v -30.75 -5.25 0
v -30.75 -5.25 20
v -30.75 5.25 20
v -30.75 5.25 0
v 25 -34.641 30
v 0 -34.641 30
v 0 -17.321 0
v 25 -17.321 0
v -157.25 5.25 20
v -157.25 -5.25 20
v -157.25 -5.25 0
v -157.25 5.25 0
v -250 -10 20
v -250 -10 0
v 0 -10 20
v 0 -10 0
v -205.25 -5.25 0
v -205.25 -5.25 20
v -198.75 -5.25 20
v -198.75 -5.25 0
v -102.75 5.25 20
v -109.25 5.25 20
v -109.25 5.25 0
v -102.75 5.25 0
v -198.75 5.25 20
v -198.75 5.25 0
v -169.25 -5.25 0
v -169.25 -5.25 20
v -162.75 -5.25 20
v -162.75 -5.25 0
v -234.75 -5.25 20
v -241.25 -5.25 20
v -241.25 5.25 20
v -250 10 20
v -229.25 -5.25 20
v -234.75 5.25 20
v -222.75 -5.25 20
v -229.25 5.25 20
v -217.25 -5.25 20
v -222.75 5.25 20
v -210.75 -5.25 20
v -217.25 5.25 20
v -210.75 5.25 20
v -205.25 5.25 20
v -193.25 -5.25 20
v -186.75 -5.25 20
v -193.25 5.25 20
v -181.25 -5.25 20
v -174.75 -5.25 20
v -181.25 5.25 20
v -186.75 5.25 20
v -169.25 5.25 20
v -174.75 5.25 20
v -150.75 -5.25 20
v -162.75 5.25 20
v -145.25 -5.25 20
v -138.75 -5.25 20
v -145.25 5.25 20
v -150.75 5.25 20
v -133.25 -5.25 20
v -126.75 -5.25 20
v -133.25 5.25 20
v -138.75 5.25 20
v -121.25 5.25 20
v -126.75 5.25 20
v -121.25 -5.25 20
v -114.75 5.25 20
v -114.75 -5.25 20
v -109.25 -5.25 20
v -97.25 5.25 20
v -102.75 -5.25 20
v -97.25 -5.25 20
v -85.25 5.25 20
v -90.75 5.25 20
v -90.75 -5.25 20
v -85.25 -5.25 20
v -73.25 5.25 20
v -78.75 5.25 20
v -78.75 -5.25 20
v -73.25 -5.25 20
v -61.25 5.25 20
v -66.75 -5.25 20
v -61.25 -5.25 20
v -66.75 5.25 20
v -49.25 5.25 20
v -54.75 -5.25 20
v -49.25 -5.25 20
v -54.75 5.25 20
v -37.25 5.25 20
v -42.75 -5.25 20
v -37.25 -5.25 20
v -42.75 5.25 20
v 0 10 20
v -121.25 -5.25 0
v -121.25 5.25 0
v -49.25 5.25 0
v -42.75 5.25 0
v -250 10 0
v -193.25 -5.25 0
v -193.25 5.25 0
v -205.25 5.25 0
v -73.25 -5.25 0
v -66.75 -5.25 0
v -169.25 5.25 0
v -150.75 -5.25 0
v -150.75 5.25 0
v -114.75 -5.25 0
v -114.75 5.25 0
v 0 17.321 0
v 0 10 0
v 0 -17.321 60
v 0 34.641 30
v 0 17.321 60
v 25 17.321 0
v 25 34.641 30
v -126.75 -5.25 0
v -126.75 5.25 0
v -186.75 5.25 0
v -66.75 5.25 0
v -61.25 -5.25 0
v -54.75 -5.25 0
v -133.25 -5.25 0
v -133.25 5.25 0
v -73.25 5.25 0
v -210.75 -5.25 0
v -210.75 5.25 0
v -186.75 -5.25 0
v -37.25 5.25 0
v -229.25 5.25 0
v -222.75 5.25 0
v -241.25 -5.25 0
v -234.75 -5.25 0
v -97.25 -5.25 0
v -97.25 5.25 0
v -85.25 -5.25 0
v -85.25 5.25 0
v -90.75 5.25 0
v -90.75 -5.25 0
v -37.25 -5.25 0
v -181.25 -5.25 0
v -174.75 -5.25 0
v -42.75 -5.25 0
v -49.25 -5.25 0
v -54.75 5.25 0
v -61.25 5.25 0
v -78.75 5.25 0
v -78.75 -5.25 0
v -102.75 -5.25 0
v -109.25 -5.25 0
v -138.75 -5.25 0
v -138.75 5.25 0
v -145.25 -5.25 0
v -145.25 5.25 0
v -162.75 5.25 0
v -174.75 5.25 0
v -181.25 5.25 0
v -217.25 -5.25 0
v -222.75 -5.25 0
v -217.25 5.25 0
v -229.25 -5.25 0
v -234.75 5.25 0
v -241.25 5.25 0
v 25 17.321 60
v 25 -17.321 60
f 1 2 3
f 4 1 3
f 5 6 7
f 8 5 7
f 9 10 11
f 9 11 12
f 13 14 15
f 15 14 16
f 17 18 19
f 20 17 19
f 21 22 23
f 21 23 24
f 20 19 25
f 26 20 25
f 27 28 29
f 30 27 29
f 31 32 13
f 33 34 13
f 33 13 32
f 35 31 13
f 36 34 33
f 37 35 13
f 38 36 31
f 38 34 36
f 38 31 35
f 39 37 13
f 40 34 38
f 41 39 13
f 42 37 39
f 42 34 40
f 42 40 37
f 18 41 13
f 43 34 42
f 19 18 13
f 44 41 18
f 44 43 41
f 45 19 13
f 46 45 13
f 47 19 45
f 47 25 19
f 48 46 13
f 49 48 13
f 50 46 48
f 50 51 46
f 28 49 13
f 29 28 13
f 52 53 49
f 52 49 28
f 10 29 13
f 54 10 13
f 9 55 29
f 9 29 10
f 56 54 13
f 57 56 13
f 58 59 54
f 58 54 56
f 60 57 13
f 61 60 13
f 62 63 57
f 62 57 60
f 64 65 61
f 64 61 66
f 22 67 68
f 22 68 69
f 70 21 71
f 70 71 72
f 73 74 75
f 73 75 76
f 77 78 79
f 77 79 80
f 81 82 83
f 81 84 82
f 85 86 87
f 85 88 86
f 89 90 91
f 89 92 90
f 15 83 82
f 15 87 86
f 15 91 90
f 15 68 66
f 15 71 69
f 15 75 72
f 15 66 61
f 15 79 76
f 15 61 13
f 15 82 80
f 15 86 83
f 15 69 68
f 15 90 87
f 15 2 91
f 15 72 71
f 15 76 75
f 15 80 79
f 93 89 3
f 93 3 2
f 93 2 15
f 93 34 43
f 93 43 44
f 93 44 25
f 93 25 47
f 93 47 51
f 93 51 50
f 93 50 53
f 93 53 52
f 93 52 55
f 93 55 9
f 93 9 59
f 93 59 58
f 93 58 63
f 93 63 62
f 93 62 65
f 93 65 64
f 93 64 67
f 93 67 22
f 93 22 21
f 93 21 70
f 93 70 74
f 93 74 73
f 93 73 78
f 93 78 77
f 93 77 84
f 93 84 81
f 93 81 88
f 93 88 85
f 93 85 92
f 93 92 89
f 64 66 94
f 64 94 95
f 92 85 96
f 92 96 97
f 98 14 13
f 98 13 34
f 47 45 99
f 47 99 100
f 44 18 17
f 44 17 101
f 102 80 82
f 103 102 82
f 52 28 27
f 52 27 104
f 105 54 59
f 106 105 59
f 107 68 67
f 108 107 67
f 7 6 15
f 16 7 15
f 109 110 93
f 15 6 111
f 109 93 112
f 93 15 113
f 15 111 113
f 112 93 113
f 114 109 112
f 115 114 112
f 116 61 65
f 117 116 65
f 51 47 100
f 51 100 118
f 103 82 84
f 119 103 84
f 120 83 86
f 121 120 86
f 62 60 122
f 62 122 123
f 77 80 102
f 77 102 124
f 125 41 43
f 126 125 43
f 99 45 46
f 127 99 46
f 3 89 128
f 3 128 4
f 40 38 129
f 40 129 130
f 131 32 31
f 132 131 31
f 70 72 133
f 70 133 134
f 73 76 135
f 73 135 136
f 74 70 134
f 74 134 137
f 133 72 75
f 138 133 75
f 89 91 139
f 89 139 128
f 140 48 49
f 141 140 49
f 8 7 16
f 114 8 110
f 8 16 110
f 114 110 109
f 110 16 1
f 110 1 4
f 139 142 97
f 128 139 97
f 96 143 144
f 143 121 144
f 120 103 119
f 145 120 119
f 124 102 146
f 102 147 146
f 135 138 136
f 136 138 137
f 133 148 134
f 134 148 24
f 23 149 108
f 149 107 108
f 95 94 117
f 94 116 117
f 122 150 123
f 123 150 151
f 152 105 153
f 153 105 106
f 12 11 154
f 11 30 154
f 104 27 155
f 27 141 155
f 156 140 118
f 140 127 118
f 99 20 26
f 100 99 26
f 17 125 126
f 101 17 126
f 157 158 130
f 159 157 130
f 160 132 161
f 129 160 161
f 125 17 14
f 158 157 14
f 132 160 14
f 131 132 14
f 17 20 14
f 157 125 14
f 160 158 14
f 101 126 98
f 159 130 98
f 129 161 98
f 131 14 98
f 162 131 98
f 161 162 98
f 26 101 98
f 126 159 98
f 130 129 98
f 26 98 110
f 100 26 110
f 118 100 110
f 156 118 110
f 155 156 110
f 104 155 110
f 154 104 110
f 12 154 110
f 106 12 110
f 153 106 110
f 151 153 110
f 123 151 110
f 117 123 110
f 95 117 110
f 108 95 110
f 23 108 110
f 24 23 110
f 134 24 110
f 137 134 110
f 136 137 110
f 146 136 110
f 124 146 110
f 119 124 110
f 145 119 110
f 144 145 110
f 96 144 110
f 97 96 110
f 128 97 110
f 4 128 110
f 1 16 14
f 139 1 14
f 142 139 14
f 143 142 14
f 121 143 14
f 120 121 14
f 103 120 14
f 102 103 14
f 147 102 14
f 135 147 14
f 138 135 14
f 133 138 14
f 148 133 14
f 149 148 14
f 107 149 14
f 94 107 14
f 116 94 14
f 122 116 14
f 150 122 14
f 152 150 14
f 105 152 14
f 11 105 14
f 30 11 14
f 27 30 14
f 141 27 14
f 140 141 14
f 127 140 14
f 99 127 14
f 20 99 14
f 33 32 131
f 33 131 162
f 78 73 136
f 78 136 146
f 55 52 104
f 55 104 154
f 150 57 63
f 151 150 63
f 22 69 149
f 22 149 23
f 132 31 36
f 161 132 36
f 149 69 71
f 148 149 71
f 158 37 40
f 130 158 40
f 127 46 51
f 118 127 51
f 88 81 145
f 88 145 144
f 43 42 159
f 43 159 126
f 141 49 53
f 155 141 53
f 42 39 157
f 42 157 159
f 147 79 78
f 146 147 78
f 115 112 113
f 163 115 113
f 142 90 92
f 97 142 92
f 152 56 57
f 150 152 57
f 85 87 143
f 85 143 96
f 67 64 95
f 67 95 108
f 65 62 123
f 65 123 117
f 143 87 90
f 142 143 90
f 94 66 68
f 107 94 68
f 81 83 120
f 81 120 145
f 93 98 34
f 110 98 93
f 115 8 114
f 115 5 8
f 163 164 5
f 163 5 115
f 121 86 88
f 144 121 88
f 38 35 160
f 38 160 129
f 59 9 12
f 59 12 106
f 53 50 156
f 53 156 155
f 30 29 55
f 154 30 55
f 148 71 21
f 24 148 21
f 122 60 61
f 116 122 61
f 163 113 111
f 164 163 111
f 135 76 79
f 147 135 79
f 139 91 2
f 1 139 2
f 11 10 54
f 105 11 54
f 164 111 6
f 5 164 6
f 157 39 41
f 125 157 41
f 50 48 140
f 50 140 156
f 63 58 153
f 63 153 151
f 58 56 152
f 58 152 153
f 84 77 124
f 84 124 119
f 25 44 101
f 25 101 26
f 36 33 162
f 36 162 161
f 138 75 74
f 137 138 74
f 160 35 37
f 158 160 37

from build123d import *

# Parameters (mm, degrees)
F1_DEPTH = 25
F2_W     = 250
F2_H     = 20
F3_DEPTH = 20
F4_W     = 6.5
F4_H     = 10.5
F5_DEPTH = 100
F6_W     = 28.428983
F6_H     = 14.421839
F7_DEPTH = 20


with BuildPart() as f1:
    # F0 (on Right) → F1 (new body)
    with BuildSketch(Plane.YZ):
        Polygon((-17.320508, 0), (17.320508, 0), (34.641016, 30), (17.320508, 60), (-17.320508, 60), (-34.641016, 30), align=None)
    extrude(amount=F1_DEPTH)

    # F2 (on Top) → F3 (join)
    with BuildSketch(Plane.XY):
        with Locations((-125, 0)):
            Rectangle(F2_W, F2_H)
    extrude(amount=F3_DEPTH)

    # F4 (on face) → F5 (cut)
    with BuildSketch(Plane.XY.offset(20)):
        with Locations((-10, 0)):
            Rectangle(F4_W, F4_H)
        with Locations((-22, 0)):
            Rectangle(F4_W, F4_H)
        with Locations((-34, 0)):
            Rectangle(F4_W, F4_H)
        with Locations((-46, 0)):
            Rectangle(F4_W, F4_H)
        with Locations((-58, 0)):
            Rectangle(F4_W, F4_H)
        with Locations((-70, 0)):
            Rectangle(F4_W, F4_H)
        with Locations((-82, 0)):
            Rectangle(F4_W, F4_H)
        with Locations((-94, 0)):
            Rectangle(F4_W, F4_H)
        with Locations((-106, 0)):
            Rectangle(F4_W, F4_H)
        with Locations((-118, 0)):
            Rectangle(F4_W, F4_H)
        with Locations((-130, 0)):
            Rectangle(F4_W, F4_H)
        with Locations((-142, 0)):
            Rectangle(F4_W, F4_H)
        with Locations((-154, 0)):
            Rectangle(F4_W, F4_H)
        with Locations((-166, 0)):
            Rectangle(F4_W, F4_H)
        with Locations((-178, 0)):
            Rectangle(F4_W, F4_H)
        with Locations((-190, 0)):
            Rectangle(F4_W, F4_H)
        with Locations((-202, 0)):
            Rectangle(F4_W, F4_H)
        with Locations((-214, 0)):
            Rectangle(F4_W, F4_H)
        with Locations((-226, 0)):
            Rectangle(F4_W, F4_H)
        with Locations((-238, 0)):
            Rectangle(F4_W, F4_H)
    extrude(amount=-F5_DEPTH, mode=Mode.SUBTRACT)

    # F6 (on Top) → F7 (join)
    with BuildSketch(Plane.XY):
        with Locations((-14.214491, 0.158192)):
            Rectangle(F6_W, F6_H)
    extrude(amount=F7_DEPTH)


solid = f1.part
